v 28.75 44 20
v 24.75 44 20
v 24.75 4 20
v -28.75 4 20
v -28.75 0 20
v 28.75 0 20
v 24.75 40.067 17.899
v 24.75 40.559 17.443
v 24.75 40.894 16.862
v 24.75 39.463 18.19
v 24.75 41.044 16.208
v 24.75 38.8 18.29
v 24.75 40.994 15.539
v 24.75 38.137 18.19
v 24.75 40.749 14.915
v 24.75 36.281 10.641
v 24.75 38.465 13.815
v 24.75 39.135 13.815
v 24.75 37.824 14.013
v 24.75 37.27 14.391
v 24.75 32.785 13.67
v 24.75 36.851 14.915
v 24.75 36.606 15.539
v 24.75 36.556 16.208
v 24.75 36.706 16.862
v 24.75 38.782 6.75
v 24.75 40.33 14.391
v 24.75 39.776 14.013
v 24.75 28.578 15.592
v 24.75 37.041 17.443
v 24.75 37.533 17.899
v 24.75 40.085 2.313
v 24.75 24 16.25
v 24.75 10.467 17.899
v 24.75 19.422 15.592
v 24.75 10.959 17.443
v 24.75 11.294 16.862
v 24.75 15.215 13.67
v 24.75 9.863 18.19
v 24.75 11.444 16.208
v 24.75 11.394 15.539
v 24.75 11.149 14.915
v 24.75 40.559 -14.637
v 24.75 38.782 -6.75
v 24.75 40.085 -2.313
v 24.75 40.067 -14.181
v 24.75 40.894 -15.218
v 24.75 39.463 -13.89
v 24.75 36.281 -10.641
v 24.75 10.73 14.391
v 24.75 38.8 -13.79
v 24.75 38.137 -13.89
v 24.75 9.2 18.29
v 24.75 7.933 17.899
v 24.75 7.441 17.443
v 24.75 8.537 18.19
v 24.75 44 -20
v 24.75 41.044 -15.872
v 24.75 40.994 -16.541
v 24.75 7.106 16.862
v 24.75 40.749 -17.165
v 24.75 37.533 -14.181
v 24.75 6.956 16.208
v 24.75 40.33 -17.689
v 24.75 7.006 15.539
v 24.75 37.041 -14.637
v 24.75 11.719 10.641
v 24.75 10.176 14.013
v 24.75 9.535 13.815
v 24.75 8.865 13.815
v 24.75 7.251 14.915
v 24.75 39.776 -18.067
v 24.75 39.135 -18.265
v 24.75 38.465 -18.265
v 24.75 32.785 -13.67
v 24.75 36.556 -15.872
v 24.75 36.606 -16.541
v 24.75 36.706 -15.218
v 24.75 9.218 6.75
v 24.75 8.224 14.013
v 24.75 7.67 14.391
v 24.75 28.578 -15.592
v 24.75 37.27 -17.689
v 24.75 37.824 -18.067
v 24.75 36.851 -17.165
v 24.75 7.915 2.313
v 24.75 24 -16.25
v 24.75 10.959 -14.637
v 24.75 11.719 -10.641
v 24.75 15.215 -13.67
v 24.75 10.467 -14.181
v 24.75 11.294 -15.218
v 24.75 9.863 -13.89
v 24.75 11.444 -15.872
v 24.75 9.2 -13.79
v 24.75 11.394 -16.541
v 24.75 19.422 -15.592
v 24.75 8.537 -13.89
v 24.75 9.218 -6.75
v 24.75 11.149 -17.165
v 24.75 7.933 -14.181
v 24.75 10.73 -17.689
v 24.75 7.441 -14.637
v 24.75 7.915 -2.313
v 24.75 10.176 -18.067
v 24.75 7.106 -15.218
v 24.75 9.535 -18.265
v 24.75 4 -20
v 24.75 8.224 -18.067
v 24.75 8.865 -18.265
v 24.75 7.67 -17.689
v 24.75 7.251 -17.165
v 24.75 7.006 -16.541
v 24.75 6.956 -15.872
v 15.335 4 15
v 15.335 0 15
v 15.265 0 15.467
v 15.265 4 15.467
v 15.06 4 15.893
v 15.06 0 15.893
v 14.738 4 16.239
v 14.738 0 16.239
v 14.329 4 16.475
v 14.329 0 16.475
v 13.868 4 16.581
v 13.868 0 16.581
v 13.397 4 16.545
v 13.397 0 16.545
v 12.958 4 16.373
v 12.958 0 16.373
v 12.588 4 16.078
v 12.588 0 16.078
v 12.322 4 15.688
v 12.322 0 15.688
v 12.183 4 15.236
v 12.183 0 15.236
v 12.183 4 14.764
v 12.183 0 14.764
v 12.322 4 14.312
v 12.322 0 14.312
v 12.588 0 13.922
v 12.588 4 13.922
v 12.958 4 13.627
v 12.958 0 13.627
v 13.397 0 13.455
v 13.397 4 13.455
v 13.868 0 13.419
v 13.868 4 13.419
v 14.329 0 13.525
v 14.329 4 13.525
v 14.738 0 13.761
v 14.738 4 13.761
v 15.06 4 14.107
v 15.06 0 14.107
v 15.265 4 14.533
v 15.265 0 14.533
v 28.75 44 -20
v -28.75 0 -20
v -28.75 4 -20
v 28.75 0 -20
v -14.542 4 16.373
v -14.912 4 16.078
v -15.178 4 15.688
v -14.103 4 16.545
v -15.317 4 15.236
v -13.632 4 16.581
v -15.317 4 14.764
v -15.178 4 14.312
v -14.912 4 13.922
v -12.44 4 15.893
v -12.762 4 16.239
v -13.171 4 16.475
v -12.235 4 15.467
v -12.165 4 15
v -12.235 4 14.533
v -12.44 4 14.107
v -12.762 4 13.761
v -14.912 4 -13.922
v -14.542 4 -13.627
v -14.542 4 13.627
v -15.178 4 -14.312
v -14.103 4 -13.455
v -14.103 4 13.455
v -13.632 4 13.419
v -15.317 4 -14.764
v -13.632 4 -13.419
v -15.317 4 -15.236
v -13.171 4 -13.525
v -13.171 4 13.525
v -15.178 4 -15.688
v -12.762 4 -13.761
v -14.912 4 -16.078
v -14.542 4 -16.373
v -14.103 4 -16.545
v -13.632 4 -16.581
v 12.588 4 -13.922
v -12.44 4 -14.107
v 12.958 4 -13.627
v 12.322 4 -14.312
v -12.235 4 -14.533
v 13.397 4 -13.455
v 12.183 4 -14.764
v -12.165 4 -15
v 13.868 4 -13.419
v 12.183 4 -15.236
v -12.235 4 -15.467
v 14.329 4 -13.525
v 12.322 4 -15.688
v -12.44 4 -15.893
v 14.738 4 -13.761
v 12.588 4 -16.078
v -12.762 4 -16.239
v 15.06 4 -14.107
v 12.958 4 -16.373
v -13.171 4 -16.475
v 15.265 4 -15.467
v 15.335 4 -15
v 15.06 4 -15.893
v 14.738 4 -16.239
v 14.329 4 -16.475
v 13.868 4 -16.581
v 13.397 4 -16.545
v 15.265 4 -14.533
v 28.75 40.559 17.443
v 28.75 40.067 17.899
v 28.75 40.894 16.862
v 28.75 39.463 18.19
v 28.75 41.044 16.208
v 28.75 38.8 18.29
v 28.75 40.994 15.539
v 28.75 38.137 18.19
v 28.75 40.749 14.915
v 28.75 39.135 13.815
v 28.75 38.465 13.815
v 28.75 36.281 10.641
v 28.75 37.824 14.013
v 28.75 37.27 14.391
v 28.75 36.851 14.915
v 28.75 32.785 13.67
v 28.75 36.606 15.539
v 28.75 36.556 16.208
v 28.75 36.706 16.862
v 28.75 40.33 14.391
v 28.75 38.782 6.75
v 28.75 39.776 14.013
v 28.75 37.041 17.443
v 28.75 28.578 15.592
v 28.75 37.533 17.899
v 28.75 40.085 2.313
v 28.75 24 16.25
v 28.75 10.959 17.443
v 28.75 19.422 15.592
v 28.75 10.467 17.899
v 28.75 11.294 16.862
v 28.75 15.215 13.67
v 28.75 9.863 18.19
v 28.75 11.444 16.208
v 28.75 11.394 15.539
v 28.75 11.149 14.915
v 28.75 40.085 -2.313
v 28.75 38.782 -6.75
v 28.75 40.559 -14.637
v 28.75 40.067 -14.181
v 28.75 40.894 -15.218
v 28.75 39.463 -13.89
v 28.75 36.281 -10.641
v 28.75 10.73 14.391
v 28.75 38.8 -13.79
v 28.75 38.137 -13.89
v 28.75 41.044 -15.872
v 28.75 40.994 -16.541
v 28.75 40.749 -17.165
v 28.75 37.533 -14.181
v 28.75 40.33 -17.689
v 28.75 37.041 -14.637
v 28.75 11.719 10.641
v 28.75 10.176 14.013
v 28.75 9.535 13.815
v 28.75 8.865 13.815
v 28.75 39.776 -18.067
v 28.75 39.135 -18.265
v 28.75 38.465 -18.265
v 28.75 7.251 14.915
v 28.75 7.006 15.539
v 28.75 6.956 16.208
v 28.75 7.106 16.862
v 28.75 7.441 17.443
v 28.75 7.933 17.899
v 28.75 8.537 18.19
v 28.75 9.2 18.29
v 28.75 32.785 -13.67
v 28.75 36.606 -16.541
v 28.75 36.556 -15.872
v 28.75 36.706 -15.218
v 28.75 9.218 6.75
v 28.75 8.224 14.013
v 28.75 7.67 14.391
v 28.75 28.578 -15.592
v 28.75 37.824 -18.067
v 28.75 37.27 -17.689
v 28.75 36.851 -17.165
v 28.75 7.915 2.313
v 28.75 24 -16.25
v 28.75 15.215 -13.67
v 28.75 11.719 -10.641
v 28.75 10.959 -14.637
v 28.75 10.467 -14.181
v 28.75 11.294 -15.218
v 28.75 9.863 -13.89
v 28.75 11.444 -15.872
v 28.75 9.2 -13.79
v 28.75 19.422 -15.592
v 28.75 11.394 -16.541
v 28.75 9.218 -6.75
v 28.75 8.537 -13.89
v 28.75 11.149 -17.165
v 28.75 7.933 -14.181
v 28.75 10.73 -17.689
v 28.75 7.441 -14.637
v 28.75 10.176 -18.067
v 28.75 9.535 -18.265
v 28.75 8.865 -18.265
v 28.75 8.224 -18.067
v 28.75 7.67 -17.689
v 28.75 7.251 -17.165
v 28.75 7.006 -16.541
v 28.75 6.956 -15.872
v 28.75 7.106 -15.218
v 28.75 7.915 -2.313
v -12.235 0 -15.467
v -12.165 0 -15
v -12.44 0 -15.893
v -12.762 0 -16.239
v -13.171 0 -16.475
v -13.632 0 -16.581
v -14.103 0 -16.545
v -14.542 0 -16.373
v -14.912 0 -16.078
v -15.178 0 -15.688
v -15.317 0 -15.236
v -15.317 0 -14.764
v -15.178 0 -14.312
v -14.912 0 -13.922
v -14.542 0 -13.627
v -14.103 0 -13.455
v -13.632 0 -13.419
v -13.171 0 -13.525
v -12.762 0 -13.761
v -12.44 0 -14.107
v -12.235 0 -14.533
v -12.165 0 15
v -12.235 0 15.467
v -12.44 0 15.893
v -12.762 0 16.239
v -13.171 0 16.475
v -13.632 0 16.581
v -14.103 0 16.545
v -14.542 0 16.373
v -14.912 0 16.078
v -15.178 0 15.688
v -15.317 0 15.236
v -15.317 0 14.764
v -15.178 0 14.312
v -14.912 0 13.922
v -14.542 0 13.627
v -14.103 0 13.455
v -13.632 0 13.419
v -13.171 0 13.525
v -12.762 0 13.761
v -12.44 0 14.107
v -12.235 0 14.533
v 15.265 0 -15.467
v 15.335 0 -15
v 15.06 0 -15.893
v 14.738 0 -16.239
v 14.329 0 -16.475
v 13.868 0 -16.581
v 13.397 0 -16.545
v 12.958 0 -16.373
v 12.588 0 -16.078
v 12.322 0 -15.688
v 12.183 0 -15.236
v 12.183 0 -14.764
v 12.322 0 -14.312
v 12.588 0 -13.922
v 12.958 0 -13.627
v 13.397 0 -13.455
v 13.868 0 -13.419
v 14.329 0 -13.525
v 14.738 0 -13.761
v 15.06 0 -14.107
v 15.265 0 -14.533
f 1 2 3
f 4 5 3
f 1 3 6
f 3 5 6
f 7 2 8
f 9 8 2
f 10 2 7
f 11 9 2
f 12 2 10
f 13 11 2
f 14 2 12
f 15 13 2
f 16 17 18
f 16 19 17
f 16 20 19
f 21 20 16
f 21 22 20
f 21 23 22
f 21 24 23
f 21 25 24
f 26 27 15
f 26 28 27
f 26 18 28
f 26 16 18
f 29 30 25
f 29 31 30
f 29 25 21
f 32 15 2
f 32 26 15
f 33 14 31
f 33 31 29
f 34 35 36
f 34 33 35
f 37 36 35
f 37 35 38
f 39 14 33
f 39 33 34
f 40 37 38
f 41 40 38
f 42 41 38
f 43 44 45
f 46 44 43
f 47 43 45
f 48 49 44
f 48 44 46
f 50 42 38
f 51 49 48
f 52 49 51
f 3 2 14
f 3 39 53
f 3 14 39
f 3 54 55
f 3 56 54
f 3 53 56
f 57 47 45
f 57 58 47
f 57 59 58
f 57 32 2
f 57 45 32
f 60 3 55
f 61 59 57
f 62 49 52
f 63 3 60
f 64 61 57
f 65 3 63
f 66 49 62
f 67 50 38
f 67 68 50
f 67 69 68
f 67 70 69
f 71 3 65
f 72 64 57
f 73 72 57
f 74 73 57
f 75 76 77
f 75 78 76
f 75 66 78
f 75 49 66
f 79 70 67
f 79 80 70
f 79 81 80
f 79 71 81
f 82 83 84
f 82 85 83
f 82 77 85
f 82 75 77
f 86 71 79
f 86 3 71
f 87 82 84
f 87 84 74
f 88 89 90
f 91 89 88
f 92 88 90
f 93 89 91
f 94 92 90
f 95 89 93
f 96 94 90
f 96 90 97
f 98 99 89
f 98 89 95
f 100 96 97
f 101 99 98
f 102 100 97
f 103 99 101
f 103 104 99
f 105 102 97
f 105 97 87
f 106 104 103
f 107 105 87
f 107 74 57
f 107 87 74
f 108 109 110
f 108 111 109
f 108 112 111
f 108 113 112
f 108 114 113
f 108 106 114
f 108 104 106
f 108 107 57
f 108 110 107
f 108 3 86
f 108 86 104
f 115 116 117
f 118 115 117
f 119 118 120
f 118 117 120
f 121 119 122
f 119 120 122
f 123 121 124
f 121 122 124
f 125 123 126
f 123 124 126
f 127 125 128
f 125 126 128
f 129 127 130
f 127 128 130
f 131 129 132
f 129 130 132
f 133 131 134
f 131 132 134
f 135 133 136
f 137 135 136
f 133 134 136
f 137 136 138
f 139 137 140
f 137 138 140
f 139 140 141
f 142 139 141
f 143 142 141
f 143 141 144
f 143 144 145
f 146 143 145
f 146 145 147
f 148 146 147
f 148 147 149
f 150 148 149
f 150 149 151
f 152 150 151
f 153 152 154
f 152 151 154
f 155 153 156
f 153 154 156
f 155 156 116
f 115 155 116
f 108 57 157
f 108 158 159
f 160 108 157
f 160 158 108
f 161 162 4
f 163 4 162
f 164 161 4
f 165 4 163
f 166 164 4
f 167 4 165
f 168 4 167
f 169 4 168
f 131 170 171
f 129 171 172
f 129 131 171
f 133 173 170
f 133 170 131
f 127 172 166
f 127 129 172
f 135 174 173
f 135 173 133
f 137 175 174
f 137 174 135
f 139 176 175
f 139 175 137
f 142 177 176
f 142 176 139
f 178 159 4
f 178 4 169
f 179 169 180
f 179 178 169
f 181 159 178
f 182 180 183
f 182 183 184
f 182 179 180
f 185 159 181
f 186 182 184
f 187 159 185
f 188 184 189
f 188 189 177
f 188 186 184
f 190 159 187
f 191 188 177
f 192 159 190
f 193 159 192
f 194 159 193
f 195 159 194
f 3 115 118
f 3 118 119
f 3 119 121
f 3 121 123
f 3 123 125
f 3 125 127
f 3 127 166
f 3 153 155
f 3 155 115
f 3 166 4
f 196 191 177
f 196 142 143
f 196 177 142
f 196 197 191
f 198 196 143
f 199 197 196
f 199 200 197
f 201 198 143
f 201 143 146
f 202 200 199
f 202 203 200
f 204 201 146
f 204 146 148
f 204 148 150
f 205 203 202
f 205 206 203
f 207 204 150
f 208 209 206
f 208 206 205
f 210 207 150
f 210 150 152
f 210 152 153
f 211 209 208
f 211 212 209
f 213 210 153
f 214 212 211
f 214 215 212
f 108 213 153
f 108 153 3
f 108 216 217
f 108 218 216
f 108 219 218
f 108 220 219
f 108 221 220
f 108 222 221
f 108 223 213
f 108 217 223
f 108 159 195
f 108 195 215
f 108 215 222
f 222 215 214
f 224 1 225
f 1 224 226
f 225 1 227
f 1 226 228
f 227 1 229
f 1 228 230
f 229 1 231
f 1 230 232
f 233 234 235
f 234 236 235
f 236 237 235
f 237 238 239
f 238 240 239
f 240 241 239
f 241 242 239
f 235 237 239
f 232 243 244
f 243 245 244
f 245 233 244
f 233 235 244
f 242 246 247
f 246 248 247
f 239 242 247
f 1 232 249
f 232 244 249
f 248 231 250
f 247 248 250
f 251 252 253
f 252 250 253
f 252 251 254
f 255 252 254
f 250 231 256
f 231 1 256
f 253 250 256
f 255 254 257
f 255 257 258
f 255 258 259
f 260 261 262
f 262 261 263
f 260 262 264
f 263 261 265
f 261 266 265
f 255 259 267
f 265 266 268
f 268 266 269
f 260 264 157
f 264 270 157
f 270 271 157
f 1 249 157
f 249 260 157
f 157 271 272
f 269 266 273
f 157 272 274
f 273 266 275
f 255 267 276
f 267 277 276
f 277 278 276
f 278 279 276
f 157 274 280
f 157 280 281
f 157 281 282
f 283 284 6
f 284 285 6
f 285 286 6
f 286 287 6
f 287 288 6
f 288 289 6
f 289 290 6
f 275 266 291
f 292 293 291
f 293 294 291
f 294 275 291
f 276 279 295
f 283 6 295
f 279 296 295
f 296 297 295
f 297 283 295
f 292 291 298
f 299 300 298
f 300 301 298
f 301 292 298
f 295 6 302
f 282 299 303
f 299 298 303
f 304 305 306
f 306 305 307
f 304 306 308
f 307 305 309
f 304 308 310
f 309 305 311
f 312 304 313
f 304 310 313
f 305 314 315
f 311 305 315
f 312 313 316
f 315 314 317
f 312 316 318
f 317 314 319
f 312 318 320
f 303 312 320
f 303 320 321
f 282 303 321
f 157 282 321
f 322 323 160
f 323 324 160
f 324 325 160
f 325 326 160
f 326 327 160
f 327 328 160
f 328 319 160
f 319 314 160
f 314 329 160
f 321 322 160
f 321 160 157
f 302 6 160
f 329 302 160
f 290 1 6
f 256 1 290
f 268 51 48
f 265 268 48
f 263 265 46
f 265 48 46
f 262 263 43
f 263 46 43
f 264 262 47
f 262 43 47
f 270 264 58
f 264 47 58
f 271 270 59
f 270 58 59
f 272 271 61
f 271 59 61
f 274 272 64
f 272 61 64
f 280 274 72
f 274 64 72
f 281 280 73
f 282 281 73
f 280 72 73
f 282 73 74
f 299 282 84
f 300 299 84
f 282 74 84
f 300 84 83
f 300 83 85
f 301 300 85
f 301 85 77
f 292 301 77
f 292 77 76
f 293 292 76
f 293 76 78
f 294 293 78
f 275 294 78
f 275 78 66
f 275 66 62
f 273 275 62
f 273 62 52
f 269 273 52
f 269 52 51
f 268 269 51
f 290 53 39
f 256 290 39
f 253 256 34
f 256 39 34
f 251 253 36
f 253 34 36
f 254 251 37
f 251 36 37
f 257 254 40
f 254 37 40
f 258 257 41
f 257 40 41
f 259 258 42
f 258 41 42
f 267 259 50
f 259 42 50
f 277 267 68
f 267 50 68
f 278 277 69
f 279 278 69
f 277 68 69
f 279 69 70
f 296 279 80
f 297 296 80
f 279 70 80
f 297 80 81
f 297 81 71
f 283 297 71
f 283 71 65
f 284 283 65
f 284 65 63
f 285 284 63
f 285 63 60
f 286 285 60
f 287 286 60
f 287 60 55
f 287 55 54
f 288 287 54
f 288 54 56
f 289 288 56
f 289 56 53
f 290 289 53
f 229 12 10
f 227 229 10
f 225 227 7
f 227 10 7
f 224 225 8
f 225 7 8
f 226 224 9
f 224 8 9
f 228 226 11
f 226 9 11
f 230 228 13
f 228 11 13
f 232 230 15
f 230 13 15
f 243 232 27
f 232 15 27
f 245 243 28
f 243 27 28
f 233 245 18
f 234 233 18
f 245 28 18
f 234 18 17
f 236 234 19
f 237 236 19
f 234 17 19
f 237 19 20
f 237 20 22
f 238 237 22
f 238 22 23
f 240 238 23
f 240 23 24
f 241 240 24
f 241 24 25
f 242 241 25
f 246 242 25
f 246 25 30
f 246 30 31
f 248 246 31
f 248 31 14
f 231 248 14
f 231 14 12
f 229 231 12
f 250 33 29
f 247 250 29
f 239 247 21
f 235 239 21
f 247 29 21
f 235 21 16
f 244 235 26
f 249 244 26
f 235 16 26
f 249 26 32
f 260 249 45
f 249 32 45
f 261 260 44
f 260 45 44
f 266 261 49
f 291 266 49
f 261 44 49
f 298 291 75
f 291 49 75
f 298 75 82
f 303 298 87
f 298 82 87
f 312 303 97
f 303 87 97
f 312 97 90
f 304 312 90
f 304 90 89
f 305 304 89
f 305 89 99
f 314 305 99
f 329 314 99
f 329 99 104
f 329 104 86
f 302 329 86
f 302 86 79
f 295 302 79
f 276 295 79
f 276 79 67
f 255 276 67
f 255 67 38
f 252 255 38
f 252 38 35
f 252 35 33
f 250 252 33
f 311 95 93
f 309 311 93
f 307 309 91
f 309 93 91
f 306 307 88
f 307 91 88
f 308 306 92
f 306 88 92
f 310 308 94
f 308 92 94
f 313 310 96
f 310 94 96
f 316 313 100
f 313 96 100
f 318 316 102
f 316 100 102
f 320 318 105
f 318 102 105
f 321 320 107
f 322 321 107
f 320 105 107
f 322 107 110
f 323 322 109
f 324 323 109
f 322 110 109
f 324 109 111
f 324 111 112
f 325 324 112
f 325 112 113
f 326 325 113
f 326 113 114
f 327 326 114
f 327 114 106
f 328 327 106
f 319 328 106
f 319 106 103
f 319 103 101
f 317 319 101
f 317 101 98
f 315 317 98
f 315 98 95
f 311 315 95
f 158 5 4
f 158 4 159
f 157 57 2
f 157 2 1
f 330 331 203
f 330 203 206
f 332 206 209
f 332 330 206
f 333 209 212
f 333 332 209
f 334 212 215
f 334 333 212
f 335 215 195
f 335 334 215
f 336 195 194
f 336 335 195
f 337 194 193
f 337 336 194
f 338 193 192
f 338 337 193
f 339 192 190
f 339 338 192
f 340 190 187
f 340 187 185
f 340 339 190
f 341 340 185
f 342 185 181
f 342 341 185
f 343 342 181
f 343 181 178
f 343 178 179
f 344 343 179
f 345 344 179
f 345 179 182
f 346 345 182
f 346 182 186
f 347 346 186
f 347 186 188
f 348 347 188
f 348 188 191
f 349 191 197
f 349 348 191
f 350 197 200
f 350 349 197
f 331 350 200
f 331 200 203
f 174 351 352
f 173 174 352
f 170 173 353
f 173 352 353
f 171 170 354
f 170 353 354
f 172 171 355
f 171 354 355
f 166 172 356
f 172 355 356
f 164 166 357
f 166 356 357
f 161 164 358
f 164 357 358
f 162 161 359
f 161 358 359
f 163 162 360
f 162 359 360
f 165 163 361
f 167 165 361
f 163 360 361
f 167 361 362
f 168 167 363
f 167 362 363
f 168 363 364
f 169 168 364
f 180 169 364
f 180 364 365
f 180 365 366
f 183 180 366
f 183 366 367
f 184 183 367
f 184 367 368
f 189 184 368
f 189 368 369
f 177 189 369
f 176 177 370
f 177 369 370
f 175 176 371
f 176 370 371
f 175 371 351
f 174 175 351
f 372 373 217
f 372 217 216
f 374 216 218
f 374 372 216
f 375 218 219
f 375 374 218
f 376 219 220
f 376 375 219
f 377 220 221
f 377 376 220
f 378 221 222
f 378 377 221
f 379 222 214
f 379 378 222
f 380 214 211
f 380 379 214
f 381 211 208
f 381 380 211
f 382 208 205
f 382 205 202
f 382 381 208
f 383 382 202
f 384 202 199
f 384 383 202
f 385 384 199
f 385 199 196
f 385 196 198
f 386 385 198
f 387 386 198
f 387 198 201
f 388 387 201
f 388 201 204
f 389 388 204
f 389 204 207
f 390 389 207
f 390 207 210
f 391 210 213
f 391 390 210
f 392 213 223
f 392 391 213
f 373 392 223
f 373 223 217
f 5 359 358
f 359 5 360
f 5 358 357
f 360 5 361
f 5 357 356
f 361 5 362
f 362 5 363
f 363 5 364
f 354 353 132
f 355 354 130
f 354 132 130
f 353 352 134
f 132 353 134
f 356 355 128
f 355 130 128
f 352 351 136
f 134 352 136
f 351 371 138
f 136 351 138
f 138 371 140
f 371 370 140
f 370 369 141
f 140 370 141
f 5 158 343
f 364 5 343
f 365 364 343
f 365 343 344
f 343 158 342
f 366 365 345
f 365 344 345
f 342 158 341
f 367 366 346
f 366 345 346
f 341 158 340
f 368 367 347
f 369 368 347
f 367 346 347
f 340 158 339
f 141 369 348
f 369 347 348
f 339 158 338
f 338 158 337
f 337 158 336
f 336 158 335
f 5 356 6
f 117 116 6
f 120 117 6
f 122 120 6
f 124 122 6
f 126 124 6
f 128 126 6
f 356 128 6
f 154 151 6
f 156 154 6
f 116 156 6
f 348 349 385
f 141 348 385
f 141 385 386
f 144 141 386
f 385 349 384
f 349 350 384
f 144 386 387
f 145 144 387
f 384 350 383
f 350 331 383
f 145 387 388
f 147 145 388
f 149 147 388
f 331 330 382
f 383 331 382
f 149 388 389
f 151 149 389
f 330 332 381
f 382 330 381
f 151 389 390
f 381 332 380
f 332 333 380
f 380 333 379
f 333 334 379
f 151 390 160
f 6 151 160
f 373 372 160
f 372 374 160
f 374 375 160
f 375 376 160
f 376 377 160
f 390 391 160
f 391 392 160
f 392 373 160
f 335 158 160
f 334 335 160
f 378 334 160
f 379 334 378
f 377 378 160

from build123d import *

# Parameters (mm, degrees)
CROQUIS1_W              = 57.5
CROQUIS1_H              = 40
SALIENTE_EXTRUIR1_DEPTH = 4
CROQUIS3_W              = 4
CROQUIS3_H              = 40
SALIENTE_EXTRUIR3_DEPTH = 40
CORTAR_EXTRUIR1_REACH   = 74.099
CROQUIS5_R              = 2.25
CORTAR_EXTRUIR2_REACH   = 74.099
CROQUIS7_R              = 16.25
CORTAR_EXTRUIR3_REACH   = 58.237
CROQUIS8_R              = 1.585


with BuildPart() as part:
    # Croquis1 → Saliente-Extruir1 (new body)
    with BuildSketch(Plane(origin=(0, 0, 0), x_dir=(1, 0, 0), z_dir=(0, 1, 0))):
        Rectangle(CROQUIS1_W, CROQUIS1_H)
    extrude(amount=SALIENTE_EXTRUIR1_DEPTH)

    # Croquis3 → Saliente-Extruir3 (add)
    with BuildSketch(Plane(origin=(0, 4, 0), x_dir=(1, 0, 0), z_dir=(0, 1, 0))):
        with Locations((26.75, 0)):
            Rectangle(CROQUIS3_W, CROQUIS3_H)
    extrude(amount=SALIENTE_EXTRUIR3_DEPTH)

    # Croquis5 → Cortar-Extruir1 (cut, up to next)
    with BuildSketch(Plane.ZY.offset(-24.75), mode=Mode.PRIVATE) as cortar_extruir1_sk1:
        with Locations((-16.04, 38.8)):
            Circle(CROQUIS5_R)
    cortar_extruir1_tool1 = extrude(cortar_extruir1_sk1.sketch, amount=-CORTAR_EXTRUIR1_REACH, mode=Mode.PRIVATE) & part.part
    # Croquis5 → Cortar-Extruir1 (cut, up to next)
    with BuildSketch(Plane.ZY.offset(-24.75), mode=Mode.PRIVATE) as cortar_extruir1_sk2:
        with Locations((16.04, 38.8)):
            Circle(CROQUIS5_R)
    cortar_extruir1_tool2 = extrude(cortar_extruir1_sk2.sketch, amount=-CORTAR_EXTRUIR1_REACH, mode=Mode.PRIVATE) & part.part
    # Croquis5 → Cortar-Extruir1 (cut, up to next)
    with BuildSketch(Plane.ZY.offset(-24.75), mode=Mode.PRIVATE) as cortar_extruir1_sk3:
        with Locations((16.04, 9.2)):
            Circle(CROQUIS5_R)
    cortar_extruir1_tool3 = extrude(cortar_extruir1_sk3.sketch, amount=-CORTAR_EXTRUIR1_REACH, mode=Mode.PRIVATE) & part.part
    # Croquis5 → Cortar-Extruir1 (cut, up to next)
    with BuildSketch(Plane.ZY.offset(-24.75), mode=Mode.PRIVATE) as cortar_extruir1_sk4:
        with Locations((-16.04, 9.2)):
            Circle(CROQUIS5_R)
    cortar_extruir1_tool4 = extrude(cortar_extruir1_sk4.sketch, amount=-CORTAR_EXTRUIR1_REACH, mode=Mode.PRIVATE) & part.part
    add(cortar_extruir1_tool1.solids().sort_by_distance((24.75, 38.8, -16.04))[0], mode=Mode.SUBTRACT)
    add(cortar_extruir1_tool2.solids().sort_by_distance((24.75, 38.8, 16.04))[0], mode=Mode.SUBTRACT)
    add(cortar_extruir1_tool3.solids().sort_by_distance((24.75, 9.2, 16.04))[0], mode=Mode.SUBTRACT)
    add(cortar_extruir1_tool4.solids().sort_by_distance((24.75, 9.2, -16.04))[0], mode=Mode.SUBTRACT)

    # Croquis7 → Cortar-Extruir2 (cut, up to next)
    with BuildSketch(Plane.ZY.offset(-24.75), mode=Mode.PRIVATE) as cortar_extruir2_sk1:
        with Locations((0, 24)):
            Circle(CROQUIS7_R)
    cortar_extruir2_tool1 = extrude(cortar_extruir2_sk1.sketch, amount=-CORTAR_EXTRUIR2_REACH, mode=Mode.PRIVATE) & part.part
    add(cortar_extruir2_tool1.solids().sort_by_distance((24.75, 24, 0))[0], mode=Mode.SUBTRACT)

    # Croquis8 → Cortar-Extruir3 (cut, up to next)
    with BuildSketch(Plane.XZ, mode=Mode.PRIVATE) as cortar_extruir3_sk1:
        with Locations((-13.75, 15)):
            Circle(CROQUIS8_R)
    cortar_extruir3_tool1 = extrude(cortar_extruir3_sk1.sketch, amount=-CORTAR_EXTRUIR3_REACH, mode=Mode.PRIVATE) & part.part
    # Croquis8 → Cortar-Extruir3 (cut, up to next)
    with BuildSketch(Plane.XZ, mode=Mode.PRIVATE) as cortar_extruir3_sk2:
        with Locations((13.75, 15)):
            Circle(CROQUIS8_R)
    cortar_extruir3_tool2 = extrude(cortar_extruir3_sk2.sketch, amount=-CORTAR_EXTRUIR3_REACH, mode=Mode.PRIVATE) & part.part
    cortar_extruir3_1 = cortar_extruir3_tool1.solids().sort_by_distance((-13.75, 0, 15))[0]
    add(cortar_extruir3_1, mode=Mode.SUBTRACT)
    cortar_extruir3_2 = cortar_extruir3_tool2.solids().sort_by_distance((13.75, 0, 15))[0]
    add(cortar_extruir3_2, mode=Mode.SUBTRACT)
    cortar_extruir3 = cortar_extruir3_1 + cortar_extruir3_2  # Cortar-Extruir3 as one shape, for the pattern or mirror that repeats it

    # Simetría1: Cortar-Extruir3 across plane
    add(cortar_extruir3.mirror(Plane.XY), mode=Mode.SUBTRACT)


solid = part.part
